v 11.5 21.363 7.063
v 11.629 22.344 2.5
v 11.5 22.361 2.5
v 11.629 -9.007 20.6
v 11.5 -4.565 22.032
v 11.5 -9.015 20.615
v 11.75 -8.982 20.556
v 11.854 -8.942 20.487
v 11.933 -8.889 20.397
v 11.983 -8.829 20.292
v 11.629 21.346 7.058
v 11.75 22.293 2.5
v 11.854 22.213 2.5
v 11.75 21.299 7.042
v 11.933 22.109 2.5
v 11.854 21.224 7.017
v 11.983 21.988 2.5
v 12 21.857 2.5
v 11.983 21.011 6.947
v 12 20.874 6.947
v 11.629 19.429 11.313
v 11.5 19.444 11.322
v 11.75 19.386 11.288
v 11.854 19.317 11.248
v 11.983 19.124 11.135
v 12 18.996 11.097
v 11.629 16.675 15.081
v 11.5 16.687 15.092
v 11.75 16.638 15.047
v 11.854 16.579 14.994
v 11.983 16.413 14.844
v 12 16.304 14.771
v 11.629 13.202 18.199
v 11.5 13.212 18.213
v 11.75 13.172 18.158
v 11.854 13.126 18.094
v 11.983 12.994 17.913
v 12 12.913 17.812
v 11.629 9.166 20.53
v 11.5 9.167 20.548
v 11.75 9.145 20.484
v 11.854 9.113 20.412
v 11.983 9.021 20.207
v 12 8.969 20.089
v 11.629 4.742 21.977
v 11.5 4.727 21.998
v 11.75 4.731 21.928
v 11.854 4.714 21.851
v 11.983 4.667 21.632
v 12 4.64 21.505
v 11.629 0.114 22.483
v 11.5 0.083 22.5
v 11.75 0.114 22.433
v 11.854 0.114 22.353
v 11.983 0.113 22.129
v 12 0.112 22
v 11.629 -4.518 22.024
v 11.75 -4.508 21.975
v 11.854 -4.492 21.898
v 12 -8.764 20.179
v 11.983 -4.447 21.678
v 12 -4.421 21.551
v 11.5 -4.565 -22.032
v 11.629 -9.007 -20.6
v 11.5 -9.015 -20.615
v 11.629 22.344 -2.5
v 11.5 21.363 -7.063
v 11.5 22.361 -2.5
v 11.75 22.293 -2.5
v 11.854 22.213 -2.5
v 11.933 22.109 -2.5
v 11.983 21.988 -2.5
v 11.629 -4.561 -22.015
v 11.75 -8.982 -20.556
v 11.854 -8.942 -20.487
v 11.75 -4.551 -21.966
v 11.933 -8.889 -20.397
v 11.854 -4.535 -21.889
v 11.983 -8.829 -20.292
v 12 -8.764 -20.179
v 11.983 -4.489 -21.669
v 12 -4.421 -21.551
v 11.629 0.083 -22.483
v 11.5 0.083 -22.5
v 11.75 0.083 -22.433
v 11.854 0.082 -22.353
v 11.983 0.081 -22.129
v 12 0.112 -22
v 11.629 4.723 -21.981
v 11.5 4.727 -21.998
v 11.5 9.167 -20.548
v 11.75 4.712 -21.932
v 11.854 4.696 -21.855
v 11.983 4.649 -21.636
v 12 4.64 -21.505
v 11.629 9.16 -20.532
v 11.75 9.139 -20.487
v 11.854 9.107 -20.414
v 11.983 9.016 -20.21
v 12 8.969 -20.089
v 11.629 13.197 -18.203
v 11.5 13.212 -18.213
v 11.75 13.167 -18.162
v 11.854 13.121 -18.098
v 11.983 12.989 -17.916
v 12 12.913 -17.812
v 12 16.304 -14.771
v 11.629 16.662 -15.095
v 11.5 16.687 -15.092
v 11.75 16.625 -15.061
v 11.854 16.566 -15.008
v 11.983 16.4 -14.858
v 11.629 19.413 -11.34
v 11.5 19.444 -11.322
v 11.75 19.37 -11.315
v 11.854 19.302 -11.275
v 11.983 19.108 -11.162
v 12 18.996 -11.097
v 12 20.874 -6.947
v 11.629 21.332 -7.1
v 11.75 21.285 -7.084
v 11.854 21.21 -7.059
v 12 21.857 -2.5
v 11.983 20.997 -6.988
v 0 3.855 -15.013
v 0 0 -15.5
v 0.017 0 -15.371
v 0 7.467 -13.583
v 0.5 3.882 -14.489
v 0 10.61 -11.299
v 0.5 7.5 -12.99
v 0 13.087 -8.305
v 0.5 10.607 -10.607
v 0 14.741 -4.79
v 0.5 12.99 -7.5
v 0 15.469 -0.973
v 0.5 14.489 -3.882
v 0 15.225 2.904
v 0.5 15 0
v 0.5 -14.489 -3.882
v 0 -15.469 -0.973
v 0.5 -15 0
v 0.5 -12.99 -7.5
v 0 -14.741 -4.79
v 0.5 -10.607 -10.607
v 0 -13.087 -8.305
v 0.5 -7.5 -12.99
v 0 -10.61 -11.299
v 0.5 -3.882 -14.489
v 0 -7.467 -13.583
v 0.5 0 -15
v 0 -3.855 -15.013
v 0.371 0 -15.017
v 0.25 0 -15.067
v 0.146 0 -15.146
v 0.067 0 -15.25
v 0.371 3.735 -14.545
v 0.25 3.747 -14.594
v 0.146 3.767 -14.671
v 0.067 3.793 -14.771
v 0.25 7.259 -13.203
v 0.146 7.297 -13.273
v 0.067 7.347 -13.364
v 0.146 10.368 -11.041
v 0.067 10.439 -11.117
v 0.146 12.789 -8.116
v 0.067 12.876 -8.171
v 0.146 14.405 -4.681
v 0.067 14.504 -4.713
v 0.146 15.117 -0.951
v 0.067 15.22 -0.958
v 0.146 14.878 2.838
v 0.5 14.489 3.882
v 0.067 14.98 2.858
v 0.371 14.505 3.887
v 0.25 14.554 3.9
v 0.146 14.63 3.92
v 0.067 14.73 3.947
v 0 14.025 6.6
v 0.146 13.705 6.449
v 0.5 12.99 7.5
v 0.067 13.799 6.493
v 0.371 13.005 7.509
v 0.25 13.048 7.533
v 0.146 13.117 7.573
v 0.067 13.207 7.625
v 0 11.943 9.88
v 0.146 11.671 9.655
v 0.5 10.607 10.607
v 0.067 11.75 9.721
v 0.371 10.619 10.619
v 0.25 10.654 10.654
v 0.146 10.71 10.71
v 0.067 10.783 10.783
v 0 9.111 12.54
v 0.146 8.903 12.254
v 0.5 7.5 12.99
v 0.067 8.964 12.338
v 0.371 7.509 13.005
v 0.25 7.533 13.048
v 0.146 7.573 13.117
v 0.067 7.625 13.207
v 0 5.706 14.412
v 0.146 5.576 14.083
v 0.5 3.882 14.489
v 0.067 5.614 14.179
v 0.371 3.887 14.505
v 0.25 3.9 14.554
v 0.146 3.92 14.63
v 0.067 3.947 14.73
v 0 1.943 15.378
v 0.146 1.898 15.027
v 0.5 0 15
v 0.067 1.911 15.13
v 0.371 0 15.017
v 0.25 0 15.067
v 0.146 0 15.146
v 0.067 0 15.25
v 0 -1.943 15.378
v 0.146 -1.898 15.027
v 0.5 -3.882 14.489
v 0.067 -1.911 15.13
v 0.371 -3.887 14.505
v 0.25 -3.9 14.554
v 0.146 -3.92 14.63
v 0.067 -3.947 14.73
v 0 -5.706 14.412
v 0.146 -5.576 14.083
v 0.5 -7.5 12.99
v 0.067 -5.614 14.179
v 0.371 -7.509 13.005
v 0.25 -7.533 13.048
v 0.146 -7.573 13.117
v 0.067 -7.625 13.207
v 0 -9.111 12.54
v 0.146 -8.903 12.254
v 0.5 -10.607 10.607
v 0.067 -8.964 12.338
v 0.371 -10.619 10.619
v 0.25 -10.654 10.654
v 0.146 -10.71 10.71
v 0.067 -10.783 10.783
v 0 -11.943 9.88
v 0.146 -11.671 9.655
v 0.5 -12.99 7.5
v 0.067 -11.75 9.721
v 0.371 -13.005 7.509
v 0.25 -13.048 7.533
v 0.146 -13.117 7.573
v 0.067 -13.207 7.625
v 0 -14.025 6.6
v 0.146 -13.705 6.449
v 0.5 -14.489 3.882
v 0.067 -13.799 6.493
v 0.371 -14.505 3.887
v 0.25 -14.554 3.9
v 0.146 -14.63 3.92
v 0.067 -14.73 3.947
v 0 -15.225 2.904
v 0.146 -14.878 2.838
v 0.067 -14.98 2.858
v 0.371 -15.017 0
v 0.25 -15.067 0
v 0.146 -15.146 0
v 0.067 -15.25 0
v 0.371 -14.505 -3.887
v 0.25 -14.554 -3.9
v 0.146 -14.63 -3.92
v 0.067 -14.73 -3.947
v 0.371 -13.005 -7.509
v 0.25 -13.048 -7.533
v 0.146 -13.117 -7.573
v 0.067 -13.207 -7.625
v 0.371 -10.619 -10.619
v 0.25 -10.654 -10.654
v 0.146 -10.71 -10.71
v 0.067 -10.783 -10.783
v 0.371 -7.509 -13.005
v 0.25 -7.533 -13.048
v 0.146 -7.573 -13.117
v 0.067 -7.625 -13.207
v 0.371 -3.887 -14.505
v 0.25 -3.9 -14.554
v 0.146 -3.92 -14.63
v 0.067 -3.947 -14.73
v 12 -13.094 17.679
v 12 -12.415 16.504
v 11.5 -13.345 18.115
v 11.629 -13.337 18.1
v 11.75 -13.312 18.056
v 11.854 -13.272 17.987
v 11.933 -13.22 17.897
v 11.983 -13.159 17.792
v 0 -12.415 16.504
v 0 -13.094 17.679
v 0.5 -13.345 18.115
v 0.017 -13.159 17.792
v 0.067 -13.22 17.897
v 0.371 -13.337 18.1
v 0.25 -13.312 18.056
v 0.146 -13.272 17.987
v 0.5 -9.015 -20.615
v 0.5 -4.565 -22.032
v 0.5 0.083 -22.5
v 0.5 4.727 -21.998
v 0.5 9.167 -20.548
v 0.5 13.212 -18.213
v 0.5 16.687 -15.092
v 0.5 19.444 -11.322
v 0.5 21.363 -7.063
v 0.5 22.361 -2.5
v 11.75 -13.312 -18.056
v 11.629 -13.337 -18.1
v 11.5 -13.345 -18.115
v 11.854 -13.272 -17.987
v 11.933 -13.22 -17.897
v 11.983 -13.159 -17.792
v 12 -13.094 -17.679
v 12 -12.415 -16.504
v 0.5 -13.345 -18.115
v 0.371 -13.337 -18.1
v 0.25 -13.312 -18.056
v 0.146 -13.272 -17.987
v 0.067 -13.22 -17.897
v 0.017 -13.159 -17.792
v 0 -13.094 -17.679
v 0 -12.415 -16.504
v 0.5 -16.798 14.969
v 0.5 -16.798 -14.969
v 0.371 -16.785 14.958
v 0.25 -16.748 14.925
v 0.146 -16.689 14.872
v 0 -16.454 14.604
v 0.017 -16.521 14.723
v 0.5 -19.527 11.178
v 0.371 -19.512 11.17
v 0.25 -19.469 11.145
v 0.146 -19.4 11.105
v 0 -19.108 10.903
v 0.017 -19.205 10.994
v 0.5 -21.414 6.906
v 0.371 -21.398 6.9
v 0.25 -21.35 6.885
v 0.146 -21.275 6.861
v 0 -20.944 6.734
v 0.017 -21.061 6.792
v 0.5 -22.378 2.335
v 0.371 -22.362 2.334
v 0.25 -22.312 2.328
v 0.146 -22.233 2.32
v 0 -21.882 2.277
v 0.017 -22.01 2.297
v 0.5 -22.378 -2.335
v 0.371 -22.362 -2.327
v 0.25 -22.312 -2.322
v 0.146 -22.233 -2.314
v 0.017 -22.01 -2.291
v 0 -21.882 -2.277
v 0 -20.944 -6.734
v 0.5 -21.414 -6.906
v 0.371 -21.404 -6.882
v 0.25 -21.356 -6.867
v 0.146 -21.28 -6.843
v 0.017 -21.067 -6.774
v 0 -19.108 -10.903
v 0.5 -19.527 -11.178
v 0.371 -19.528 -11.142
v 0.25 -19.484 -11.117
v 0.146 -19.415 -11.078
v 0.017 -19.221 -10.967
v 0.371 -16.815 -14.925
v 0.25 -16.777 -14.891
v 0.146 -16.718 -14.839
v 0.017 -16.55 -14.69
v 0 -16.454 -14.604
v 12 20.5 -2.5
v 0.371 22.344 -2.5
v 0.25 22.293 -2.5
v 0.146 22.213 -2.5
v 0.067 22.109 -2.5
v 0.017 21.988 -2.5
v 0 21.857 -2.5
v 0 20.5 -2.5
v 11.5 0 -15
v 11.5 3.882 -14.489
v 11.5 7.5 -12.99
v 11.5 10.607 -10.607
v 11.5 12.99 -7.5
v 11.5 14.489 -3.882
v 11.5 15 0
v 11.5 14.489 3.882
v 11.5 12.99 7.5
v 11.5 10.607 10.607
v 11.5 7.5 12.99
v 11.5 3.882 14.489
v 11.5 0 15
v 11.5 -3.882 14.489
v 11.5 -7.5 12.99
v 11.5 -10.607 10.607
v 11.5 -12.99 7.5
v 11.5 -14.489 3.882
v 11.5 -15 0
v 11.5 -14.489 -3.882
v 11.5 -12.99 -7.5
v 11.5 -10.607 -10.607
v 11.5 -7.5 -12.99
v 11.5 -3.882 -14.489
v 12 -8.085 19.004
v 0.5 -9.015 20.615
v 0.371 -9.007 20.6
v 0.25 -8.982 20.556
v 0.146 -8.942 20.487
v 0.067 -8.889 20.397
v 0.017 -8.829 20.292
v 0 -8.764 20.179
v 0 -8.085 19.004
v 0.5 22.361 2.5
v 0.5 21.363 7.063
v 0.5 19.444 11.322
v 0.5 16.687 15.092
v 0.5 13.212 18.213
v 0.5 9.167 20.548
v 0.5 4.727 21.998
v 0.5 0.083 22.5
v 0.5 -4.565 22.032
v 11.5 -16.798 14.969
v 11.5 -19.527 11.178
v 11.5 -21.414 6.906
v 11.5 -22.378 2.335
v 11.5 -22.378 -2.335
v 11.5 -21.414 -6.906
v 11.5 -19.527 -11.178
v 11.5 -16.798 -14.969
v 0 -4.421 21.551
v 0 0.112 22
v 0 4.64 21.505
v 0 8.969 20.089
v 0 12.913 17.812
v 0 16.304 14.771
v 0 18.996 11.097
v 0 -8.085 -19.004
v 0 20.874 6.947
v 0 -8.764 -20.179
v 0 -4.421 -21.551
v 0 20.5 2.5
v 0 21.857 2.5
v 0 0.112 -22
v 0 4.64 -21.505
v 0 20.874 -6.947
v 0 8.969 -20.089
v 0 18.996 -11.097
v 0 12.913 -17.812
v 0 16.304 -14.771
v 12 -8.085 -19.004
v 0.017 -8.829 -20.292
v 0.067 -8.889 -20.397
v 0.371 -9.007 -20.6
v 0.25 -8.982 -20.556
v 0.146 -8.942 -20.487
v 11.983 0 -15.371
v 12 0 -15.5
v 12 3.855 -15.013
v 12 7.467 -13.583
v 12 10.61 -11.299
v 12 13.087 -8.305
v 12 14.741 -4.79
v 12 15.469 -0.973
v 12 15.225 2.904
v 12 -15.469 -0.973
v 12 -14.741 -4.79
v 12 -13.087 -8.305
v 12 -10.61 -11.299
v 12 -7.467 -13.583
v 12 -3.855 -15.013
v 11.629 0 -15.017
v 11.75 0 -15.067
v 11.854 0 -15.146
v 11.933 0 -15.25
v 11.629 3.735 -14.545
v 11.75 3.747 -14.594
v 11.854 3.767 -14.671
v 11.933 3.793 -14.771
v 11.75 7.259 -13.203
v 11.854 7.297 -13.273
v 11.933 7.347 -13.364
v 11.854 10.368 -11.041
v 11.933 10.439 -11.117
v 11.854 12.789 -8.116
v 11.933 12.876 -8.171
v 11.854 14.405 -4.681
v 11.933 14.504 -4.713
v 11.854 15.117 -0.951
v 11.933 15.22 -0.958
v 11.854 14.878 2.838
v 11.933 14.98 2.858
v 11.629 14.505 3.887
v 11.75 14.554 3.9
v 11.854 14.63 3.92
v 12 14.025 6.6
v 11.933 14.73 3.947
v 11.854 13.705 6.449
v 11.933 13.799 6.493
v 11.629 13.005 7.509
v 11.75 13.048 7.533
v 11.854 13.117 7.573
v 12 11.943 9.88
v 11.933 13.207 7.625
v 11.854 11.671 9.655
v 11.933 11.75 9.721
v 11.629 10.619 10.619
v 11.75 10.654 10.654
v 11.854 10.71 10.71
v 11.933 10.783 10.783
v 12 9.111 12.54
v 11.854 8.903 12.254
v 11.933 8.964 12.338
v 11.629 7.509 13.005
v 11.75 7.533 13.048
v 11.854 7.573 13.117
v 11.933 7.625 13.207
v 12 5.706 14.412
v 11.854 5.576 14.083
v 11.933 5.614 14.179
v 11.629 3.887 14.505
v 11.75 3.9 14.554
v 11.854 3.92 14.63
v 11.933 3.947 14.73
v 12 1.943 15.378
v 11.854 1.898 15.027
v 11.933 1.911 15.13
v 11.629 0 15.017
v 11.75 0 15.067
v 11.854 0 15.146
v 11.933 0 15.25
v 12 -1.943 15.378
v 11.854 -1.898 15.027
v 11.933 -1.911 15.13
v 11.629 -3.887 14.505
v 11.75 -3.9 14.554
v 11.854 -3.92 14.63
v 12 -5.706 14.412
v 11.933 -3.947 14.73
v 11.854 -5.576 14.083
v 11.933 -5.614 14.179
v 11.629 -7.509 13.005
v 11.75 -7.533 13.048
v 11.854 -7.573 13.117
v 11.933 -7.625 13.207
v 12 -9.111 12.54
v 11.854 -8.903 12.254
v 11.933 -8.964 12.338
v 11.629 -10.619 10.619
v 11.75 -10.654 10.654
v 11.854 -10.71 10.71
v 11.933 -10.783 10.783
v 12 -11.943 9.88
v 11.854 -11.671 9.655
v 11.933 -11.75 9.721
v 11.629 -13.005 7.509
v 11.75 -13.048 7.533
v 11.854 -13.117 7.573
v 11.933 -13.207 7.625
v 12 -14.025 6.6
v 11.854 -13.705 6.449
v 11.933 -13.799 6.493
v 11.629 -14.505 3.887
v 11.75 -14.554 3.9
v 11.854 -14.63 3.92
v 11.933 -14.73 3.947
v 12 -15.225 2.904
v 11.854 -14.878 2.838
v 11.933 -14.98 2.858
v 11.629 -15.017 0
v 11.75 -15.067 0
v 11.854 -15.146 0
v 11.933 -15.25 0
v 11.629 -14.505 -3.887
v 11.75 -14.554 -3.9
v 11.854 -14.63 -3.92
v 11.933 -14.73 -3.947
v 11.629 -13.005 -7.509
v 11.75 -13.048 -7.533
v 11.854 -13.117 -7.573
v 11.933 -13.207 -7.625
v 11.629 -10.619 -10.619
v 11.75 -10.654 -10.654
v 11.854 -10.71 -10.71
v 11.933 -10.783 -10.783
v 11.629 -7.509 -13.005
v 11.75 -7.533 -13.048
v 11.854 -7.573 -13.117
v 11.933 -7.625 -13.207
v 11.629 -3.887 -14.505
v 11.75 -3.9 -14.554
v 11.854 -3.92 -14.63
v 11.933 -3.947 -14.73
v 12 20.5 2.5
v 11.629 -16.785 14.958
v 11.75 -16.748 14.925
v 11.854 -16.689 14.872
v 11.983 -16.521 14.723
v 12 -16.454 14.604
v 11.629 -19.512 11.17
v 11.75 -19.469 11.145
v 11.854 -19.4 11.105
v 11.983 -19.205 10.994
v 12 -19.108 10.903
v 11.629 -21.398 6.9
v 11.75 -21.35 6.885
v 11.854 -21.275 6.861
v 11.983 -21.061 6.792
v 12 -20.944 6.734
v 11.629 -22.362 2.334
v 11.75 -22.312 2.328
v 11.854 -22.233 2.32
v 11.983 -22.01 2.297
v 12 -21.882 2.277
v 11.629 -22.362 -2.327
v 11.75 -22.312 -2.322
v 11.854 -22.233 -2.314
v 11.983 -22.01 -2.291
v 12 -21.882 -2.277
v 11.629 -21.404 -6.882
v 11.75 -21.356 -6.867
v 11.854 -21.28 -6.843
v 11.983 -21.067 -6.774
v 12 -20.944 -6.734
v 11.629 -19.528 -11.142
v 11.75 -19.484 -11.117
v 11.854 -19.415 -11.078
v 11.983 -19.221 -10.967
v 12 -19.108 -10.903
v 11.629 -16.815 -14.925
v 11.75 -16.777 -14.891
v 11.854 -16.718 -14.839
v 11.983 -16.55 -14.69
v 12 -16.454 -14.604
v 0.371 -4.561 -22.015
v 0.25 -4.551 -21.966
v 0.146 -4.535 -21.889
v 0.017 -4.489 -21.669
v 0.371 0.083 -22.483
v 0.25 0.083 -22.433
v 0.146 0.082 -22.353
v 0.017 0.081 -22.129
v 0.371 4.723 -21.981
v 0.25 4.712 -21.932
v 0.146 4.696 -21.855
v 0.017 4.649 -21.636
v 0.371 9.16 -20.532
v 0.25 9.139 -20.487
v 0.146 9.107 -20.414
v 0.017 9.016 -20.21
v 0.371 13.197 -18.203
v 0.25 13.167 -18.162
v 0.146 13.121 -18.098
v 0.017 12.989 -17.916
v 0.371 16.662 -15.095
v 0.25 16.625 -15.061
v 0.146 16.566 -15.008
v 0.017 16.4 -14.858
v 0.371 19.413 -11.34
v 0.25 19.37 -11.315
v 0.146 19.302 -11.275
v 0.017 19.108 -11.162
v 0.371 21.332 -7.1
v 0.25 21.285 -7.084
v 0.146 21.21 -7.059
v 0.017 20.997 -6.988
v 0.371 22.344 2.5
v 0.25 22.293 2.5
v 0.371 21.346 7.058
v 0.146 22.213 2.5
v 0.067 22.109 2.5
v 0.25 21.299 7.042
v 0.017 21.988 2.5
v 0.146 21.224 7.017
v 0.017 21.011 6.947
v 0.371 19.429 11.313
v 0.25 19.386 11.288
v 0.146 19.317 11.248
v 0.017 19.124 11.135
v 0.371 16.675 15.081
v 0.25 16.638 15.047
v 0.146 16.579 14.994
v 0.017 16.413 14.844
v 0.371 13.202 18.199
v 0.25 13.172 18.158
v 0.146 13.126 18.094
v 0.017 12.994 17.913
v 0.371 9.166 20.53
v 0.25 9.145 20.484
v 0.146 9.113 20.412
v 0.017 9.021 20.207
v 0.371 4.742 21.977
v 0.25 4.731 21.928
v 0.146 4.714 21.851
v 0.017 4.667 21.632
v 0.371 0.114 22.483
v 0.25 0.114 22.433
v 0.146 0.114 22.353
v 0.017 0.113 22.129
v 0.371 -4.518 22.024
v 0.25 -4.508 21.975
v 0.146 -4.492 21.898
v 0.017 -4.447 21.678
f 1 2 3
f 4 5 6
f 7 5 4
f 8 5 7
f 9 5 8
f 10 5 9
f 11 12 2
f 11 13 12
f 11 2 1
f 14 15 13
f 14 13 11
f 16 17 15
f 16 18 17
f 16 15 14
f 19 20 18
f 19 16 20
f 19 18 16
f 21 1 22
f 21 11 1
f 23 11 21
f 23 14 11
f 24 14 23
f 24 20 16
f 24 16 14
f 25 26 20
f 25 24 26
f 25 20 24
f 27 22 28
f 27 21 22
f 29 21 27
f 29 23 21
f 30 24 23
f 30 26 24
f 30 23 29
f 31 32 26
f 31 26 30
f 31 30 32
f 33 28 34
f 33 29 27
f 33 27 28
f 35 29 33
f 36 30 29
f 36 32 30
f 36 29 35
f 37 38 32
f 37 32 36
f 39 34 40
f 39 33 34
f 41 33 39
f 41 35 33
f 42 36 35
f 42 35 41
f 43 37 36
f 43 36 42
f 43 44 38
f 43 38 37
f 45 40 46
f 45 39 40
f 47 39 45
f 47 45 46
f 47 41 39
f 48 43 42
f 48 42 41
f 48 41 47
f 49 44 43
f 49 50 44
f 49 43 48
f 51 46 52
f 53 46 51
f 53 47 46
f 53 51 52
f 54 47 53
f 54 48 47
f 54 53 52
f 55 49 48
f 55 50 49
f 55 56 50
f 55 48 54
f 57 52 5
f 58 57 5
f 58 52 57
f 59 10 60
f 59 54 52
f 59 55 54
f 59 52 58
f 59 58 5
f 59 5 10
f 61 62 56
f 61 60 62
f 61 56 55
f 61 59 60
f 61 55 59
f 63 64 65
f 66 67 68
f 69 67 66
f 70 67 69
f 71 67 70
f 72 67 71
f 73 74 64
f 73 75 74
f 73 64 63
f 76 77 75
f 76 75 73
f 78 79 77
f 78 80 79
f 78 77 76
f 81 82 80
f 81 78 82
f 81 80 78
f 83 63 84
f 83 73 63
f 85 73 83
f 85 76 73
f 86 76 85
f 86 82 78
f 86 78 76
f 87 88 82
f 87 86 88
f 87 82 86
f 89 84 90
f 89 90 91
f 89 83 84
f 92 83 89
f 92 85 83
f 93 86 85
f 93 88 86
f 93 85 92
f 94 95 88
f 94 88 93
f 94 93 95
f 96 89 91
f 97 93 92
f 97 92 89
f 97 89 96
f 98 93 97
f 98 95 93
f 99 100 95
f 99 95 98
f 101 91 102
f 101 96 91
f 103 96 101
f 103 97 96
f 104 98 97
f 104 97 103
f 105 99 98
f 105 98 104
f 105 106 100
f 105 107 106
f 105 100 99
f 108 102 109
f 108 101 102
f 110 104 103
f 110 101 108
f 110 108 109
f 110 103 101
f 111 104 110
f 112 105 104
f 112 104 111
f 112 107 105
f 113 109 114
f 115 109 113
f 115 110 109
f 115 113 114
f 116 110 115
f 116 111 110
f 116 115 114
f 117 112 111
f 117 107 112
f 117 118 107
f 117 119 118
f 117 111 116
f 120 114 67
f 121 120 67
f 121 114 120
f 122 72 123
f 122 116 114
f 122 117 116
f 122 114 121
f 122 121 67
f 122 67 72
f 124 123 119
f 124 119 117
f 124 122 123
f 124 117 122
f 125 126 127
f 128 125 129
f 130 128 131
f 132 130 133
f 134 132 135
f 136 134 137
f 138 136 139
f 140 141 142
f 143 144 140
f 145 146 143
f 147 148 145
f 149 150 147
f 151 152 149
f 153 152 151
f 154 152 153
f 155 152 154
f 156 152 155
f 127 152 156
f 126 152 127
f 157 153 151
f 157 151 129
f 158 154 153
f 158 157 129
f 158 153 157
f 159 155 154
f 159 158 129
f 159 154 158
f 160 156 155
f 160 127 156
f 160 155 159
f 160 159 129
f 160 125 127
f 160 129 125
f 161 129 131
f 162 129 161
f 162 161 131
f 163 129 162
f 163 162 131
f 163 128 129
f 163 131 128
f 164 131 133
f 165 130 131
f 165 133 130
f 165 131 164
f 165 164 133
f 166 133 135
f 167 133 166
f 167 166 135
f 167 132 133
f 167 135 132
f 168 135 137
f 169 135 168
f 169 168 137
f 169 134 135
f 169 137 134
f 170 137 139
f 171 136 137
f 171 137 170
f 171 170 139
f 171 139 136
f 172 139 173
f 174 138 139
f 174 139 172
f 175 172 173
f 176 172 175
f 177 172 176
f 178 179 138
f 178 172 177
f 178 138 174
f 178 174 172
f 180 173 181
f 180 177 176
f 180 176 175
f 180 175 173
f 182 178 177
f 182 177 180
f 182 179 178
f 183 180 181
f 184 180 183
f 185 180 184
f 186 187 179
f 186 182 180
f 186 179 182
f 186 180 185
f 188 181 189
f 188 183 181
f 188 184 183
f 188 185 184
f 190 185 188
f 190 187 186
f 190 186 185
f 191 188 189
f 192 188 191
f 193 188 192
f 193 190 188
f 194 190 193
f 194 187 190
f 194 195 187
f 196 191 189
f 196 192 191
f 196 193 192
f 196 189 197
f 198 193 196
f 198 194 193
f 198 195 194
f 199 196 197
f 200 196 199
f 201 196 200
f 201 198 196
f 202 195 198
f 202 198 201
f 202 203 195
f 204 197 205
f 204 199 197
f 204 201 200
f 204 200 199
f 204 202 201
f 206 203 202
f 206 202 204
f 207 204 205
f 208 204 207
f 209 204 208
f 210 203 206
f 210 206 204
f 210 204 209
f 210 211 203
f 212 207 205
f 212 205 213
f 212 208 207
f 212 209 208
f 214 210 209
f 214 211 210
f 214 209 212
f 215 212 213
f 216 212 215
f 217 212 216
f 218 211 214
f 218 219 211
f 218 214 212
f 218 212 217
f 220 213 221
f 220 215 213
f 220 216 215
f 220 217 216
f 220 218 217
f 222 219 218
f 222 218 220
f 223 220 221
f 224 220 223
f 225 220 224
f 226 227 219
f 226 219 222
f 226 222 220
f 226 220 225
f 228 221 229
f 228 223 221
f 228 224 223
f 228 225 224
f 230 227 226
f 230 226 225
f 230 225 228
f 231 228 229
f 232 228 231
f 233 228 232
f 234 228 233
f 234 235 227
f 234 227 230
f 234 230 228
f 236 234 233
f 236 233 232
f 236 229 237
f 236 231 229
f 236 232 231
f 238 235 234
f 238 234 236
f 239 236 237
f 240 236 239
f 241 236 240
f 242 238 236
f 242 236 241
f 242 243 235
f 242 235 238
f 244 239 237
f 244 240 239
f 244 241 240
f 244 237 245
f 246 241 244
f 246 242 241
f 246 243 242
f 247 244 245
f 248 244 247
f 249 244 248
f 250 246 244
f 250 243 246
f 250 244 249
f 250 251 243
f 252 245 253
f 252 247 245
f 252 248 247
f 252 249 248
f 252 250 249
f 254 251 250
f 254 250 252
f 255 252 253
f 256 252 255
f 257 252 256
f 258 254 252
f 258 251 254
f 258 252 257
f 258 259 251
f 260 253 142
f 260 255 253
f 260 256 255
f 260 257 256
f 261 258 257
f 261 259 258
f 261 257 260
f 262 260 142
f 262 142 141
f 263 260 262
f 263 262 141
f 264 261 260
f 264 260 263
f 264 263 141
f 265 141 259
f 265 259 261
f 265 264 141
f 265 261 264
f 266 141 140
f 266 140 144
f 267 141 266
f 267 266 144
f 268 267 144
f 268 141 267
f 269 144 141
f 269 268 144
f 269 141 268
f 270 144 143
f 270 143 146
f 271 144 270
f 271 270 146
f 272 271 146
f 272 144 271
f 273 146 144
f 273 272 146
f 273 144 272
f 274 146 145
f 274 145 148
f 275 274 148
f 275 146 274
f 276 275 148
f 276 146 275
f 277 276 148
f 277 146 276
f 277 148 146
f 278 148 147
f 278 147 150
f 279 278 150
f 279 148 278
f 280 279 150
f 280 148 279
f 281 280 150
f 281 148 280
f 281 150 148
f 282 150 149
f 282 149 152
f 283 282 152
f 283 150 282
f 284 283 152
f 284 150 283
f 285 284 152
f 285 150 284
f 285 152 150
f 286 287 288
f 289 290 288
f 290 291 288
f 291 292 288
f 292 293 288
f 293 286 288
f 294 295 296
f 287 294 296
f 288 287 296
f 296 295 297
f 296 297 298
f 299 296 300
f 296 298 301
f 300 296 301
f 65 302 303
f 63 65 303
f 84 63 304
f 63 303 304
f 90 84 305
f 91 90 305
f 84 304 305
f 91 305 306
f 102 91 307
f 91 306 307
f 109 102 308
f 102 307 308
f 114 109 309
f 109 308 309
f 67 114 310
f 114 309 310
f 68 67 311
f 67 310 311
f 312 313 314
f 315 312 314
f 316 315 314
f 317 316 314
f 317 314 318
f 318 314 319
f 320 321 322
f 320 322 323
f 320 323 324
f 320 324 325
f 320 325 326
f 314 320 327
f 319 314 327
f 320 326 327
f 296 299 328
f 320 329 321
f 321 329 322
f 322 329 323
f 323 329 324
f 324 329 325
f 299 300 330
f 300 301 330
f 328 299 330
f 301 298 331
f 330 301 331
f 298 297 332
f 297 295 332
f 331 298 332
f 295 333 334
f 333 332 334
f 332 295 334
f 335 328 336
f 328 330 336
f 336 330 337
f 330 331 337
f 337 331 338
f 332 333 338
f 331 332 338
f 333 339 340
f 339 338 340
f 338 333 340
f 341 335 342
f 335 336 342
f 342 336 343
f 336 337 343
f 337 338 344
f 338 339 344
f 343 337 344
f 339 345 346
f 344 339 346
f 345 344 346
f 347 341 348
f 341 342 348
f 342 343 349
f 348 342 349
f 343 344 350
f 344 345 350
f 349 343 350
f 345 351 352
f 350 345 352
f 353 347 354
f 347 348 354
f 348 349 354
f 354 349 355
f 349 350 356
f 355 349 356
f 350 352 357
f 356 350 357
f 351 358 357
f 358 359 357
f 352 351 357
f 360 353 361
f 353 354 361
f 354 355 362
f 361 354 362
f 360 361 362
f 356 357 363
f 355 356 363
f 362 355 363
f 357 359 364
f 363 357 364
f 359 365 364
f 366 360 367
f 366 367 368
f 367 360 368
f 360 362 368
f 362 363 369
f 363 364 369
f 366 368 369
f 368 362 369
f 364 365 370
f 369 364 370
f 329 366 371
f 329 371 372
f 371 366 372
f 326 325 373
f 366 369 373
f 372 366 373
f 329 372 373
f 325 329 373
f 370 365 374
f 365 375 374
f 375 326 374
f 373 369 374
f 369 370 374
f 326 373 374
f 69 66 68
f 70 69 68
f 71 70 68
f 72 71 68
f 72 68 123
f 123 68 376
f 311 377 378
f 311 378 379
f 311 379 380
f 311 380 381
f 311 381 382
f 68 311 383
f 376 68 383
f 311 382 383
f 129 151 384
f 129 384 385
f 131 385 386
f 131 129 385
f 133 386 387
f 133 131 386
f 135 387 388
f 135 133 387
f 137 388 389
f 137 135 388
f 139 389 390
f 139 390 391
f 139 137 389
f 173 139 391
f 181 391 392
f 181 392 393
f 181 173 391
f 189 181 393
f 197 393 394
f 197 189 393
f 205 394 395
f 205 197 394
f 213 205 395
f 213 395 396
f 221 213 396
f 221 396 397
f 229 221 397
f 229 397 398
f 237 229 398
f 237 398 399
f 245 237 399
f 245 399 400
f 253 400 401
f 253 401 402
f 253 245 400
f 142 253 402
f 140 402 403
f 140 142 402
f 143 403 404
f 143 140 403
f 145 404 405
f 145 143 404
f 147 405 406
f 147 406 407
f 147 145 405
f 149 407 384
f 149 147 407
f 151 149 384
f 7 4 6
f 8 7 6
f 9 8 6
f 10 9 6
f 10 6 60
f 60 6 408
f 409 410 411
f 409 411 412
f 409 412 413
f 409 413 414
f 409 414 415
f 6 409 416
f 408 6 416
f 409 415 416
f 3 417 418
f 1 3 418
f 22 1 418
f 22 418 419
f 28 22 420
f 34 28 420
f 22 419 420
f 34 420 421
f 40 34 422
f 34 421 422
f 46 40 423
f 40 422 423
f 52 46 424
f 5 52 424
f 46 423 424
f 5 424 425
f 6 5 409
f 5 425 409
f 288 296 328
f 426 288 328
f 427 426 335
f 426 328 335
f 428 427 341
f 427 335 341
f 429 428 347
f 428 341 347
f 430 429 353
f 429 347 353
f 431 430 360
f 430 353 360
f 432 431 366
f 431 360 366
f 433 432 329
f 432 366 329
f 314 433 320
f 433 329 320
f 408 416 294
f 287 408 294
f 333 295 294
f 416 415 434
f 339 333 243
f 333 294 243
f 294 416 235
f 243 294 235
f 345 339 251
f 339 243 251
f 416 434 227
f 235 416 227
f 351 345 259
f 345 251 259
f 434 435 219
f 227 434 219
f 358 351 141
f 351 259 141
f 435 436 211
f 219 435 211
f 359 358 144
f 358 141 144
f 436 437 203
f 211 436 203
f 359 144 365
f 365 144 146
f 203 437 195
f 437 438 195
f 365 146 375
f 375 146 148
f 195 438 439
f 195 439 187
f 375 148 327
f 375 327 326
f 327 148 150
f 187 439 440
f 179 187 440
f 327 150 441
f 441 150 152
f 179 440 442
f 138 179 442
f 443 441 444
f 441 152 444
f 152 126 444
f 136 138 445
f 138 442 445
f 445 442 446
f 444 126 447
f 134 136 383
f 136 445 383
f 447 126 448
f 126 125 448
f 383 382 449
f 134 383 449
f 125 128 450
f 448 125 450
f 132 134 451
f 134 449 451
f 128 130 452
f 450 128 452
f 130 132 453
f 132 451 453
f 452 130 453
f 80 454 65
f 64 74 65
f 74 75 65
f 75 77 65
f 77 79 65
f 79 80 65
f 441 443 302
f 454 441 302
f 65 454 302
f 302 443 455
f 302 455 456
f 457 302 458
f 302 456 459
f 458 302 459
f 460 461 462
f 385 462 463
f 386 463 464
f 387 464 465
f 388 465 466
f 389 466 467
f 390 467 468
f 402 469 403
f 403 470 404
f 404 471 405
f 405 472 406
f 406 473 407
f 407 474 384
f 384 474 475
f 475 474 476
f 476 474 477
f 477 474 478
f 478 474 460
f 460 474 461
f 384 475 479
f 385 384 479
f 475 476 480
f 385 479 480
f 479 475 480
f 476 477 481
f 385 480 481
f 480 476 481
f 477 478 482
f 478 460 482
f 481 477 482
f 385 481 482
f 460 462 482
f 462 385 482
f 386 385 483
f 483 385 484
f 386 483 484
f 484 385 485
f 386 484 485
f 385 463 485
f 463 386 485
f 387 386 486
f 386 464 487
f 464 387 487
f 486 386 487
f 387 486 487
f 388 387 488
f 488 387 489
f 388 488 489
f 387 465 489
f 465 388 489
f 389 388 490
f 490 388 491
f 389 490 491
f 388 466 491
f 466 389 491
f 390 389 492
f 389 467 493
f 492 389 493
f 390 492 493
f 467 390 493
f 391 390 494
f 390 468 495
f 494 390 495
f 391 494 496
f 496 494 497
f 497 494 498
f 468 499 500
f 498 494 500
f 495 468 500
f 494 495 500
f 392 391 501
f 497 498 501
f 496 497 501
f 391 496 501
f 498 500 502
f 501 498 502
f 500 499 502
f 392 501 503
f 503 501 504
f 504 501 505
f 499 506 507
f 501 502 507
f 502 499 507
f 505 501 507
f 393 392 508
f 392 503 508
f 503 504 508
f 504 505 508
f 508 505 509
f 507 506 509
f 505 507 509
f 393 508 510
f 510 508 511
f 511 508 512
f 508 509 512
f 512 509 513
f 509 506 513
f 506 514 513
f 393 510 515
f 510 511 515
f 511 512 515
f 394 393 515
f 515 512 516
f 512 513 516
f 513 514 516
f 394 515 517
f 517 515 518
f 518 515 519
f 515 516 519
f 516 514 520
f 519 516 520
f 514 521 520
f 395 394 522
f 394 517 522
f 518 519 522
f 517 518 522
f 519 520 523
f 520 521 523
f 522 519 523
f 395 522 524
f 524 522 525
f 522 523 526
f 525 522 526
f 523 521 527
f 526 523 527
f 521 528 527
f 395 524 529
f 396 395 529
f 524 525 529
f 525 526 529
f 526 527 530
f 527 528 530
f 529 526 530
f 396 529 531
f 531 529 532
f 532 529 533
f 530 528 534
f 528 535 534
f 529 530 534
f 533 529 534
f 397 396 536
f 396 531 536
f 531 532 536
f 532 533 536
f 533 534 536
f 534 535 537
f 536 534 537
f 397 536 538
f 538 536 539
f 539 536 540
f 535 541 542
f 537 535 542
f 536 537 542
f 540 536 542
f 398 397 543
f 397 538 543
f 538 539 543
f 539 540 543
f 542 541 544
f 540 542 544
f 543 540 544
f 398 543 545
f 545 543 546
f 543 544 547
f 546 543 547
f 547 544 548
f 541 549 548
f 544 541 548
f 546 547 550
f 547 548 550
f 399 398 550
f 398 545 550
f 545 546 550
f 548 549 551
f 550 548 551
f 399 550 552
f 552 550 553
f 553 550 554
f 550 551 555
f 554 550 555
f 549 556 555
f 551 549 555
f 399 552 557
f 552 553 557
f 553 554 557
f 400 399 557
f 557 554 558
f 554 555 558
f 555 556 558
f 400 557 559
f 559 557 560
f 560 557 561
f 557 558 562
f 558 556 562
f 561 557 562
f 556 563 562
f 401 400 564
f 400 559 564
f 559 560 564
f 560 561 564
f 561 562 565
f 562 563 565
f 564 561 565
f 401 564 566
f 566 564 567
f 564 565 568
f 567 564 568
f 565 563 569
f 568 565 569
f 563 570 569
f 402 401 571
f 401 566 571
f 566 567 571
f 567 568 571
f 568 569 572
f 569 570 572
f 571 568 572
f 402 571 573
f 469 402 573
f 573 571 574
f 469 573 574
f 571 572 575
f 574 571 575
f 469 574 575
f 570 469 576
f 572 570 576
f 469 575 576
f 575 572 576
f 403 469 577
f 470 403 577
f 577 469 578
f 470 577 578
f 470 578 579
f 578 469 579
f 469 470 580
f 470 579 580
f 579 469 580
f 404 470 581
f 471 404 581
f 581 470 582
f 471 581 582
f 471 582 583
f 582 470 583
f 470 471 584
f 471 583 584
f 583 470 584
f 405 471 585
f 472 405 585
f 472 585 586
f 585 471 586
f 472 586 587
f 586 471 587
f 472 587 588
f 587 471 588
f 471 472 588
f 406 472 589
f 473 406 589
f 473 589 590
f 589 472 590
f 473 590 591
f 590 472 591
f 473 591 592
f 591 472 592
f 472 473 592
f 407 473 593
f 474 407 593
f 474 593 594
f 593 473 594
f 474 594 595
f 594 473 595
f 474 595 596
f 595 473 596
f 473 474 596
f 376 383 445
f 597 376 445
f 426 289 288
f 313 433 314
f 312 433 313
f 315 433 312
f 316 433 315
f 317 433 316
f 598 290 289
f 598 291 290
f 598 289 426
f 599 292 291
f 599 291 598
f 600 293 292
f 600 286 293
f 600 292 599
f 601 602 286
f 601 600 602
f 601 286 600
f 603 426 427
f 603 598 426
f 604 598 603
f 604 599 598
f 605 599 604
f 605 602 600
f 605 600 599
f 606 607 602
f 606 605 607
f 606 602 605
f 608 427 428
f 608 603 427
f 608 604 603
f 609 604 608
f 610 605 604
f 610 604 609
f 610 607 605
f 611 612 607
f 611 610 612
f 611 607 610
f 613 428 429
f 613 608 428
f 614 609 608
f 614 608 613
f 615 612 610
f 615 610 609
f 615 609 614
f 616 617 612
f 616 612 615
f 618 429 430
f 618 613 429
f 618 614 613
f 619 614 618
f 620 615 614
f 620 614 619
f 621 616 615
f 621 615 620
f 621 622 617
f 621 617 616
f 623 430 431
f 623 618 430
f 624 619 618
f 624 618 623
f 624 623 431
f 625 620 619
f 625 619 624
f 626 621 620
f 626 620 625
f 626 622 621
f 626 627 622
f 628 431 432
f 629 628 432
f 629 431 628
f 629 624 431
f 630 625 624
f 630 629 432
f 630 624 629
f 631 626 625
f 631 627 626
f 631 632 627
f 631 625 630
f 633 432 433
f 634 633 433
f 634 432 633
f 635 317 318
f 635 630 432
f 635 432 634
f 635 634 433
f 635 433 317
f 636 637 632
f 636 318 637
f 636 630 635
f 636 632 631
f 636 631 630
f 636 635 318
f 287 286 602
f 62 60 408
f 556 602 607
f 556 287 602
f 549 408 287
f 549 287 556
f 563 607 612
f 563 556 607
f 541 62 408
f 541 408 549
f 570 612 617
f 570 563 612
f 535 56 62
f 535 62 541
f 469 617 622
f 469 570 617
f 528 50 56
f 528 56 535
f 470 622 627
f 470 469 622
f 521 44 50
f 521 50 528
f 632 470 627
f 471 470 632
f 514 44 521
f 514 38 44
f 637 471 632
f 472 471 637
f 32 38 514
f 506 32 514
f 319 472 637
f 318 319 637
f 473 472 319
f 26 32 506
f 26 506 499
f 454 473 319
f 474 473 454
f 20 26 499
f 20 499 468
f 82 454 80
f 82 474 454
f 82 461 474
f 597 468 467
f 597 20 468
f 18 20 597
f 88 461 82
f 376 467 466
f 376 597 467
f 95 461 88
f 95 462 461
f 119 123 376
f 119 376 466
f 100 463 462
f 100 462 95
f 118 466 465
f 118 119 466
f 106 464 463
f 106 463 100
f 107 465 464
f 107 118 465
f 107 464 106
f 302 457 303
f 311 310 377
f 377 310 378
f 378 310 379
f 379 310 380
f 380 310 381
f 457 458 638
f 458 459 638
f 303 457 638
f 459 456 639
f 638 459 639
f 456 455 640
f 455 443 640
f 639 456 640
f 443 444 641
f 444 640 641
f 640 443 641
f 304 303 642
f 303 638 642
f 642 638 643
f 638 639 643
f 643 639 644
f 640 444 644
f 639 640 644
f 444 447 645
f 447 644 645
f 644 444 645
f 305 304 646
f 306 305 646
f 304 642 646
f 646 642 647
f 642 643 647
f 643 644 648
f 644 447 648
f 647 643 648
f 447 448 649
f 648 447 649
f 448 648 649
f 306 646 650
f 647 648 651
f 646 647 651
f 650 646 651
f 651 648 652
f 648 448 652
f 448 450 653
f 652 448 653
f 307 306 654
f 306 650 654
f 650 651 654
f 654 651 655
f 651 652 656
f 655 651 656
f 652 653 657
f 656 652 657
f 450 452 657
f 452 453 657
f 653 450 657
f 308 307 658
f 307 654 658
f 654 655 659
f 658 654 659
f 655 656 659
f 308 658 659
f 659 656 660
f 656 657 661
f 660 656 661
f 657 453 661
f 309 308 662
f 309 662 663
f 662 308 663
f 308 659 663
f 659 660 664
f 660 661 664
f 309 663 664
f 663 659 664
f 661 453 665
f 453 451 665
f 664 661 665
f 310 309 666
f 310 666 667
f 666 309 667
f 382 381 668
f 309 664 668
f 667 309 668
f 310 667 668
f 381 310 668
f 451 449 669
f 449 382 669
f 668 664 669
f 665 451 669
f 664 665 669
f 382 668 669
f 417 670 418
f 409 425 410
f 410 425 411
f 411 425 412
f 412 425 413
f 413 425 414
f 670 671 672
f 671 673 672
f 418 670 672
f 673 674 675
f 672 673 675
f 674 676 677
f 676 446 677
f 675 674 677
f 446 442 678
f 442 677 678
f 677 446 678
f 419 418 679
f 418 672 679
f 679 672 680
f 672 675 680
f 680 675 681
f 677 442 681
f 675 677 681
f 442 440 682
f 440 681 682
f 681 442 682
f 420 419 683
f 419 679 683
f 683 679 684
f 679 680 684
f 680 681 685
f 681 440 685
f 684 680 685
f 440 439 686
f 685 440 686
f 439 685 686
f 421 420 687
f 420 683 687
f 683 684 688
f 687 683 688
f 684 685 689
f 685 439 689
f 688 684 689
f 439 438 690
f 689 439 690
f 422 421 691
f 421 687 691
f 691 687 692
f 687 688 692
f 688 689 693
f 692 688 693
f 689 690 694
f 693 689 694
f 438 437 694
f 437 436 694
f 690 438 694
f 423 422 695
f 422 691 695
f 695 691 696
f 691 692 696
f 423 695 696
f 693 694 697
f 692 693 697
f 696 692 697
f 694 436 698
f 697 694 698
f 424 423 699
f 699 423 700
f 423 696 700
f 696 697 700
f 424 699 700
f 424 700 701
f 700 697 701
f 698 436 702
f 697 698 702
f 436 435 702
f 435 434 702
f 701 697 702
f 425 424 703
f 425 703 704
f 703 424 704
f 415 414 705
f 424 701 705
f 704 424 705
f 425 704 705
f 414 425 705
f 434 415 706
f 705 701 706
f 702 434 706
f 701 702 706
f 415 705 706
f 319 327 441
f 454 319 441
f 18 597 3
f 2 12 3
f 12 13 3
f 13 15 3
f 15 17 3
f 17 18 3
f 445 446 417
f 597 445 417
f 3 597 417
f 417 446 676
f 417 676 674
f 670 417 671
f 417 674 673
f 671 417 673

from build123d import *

# Parameters (mm, degrees)
SKETCH_7_R      = 15
EXTRUDE_2_DEPTH = 12
FILLET_1_R      = 0.5


with BuildPart() as part:
    # Sketch 7 → Extrude 2 (new body)
    with BuildSketch(Plane(origin=(0, 0, 0), x_dir=(0, 0, -1), z_dir=(1, 0, 0))):
        with BuildLine():
            Line((18.114916731, -13.345403397), (16.503520778, -12.415063509))
            Line((16.503520778, -12.415063509), (19.003520778, -8.084936491))
            Line((19.003520778, -8.084936491), (20.614916731, -9.015276378))
            ThreePointArc((20.614916731, -9.015276378), (19.485571585, 11.25), (2.5, 22.360679775))
            Line((2.5, 22.360679775), (2.5, 20.5))
            Line((2.5, 20.5), (-2.5, 20.5))
            Line((-2.5, 20.5), (-2.5, 22.360679775))
            ThreePointArc((-2.5, 22.360679775), (-19.485571585, 11.25), (-20.614916731, -9.015276378))
            Line((-20.614916731, -9.015276378), (-19.003520778, -8.084936491))
            Line((-19.003520778, -8.084936491), (-16.503520778, -12.415063509))
            Line((-16.503520778, -12.415063509), (-18.114916731, -13.345403397))
            ThreePointArc((-18.114916731, -13.345403397), (0, -22.5), (18.114916731, -13.345403397))
        make_face()
        Circle(SKETCH_7_R, mode=Mode.SUBTRACT)
    extrude(amount=EXTRUDE_2_DEPTH)

    # Fillet 1
    fillet_1_edges = [part.edges().sort_by_distance(p)[0] for p in [
        (0, -22.5, 0),
        (0, 11.25, 19.485571585),
        (0, 11.25, -19.485571585),
        (12, 11.25, 19.485571585),
        (0, 0, 15),
        (12, 0, 15),
        (12, -22.5, 0),
        (12, 11.25, -19.485571585),
    ]]
    fillet(fillet_1_edges, radius=FILLET_1_R)


solid = part.part
